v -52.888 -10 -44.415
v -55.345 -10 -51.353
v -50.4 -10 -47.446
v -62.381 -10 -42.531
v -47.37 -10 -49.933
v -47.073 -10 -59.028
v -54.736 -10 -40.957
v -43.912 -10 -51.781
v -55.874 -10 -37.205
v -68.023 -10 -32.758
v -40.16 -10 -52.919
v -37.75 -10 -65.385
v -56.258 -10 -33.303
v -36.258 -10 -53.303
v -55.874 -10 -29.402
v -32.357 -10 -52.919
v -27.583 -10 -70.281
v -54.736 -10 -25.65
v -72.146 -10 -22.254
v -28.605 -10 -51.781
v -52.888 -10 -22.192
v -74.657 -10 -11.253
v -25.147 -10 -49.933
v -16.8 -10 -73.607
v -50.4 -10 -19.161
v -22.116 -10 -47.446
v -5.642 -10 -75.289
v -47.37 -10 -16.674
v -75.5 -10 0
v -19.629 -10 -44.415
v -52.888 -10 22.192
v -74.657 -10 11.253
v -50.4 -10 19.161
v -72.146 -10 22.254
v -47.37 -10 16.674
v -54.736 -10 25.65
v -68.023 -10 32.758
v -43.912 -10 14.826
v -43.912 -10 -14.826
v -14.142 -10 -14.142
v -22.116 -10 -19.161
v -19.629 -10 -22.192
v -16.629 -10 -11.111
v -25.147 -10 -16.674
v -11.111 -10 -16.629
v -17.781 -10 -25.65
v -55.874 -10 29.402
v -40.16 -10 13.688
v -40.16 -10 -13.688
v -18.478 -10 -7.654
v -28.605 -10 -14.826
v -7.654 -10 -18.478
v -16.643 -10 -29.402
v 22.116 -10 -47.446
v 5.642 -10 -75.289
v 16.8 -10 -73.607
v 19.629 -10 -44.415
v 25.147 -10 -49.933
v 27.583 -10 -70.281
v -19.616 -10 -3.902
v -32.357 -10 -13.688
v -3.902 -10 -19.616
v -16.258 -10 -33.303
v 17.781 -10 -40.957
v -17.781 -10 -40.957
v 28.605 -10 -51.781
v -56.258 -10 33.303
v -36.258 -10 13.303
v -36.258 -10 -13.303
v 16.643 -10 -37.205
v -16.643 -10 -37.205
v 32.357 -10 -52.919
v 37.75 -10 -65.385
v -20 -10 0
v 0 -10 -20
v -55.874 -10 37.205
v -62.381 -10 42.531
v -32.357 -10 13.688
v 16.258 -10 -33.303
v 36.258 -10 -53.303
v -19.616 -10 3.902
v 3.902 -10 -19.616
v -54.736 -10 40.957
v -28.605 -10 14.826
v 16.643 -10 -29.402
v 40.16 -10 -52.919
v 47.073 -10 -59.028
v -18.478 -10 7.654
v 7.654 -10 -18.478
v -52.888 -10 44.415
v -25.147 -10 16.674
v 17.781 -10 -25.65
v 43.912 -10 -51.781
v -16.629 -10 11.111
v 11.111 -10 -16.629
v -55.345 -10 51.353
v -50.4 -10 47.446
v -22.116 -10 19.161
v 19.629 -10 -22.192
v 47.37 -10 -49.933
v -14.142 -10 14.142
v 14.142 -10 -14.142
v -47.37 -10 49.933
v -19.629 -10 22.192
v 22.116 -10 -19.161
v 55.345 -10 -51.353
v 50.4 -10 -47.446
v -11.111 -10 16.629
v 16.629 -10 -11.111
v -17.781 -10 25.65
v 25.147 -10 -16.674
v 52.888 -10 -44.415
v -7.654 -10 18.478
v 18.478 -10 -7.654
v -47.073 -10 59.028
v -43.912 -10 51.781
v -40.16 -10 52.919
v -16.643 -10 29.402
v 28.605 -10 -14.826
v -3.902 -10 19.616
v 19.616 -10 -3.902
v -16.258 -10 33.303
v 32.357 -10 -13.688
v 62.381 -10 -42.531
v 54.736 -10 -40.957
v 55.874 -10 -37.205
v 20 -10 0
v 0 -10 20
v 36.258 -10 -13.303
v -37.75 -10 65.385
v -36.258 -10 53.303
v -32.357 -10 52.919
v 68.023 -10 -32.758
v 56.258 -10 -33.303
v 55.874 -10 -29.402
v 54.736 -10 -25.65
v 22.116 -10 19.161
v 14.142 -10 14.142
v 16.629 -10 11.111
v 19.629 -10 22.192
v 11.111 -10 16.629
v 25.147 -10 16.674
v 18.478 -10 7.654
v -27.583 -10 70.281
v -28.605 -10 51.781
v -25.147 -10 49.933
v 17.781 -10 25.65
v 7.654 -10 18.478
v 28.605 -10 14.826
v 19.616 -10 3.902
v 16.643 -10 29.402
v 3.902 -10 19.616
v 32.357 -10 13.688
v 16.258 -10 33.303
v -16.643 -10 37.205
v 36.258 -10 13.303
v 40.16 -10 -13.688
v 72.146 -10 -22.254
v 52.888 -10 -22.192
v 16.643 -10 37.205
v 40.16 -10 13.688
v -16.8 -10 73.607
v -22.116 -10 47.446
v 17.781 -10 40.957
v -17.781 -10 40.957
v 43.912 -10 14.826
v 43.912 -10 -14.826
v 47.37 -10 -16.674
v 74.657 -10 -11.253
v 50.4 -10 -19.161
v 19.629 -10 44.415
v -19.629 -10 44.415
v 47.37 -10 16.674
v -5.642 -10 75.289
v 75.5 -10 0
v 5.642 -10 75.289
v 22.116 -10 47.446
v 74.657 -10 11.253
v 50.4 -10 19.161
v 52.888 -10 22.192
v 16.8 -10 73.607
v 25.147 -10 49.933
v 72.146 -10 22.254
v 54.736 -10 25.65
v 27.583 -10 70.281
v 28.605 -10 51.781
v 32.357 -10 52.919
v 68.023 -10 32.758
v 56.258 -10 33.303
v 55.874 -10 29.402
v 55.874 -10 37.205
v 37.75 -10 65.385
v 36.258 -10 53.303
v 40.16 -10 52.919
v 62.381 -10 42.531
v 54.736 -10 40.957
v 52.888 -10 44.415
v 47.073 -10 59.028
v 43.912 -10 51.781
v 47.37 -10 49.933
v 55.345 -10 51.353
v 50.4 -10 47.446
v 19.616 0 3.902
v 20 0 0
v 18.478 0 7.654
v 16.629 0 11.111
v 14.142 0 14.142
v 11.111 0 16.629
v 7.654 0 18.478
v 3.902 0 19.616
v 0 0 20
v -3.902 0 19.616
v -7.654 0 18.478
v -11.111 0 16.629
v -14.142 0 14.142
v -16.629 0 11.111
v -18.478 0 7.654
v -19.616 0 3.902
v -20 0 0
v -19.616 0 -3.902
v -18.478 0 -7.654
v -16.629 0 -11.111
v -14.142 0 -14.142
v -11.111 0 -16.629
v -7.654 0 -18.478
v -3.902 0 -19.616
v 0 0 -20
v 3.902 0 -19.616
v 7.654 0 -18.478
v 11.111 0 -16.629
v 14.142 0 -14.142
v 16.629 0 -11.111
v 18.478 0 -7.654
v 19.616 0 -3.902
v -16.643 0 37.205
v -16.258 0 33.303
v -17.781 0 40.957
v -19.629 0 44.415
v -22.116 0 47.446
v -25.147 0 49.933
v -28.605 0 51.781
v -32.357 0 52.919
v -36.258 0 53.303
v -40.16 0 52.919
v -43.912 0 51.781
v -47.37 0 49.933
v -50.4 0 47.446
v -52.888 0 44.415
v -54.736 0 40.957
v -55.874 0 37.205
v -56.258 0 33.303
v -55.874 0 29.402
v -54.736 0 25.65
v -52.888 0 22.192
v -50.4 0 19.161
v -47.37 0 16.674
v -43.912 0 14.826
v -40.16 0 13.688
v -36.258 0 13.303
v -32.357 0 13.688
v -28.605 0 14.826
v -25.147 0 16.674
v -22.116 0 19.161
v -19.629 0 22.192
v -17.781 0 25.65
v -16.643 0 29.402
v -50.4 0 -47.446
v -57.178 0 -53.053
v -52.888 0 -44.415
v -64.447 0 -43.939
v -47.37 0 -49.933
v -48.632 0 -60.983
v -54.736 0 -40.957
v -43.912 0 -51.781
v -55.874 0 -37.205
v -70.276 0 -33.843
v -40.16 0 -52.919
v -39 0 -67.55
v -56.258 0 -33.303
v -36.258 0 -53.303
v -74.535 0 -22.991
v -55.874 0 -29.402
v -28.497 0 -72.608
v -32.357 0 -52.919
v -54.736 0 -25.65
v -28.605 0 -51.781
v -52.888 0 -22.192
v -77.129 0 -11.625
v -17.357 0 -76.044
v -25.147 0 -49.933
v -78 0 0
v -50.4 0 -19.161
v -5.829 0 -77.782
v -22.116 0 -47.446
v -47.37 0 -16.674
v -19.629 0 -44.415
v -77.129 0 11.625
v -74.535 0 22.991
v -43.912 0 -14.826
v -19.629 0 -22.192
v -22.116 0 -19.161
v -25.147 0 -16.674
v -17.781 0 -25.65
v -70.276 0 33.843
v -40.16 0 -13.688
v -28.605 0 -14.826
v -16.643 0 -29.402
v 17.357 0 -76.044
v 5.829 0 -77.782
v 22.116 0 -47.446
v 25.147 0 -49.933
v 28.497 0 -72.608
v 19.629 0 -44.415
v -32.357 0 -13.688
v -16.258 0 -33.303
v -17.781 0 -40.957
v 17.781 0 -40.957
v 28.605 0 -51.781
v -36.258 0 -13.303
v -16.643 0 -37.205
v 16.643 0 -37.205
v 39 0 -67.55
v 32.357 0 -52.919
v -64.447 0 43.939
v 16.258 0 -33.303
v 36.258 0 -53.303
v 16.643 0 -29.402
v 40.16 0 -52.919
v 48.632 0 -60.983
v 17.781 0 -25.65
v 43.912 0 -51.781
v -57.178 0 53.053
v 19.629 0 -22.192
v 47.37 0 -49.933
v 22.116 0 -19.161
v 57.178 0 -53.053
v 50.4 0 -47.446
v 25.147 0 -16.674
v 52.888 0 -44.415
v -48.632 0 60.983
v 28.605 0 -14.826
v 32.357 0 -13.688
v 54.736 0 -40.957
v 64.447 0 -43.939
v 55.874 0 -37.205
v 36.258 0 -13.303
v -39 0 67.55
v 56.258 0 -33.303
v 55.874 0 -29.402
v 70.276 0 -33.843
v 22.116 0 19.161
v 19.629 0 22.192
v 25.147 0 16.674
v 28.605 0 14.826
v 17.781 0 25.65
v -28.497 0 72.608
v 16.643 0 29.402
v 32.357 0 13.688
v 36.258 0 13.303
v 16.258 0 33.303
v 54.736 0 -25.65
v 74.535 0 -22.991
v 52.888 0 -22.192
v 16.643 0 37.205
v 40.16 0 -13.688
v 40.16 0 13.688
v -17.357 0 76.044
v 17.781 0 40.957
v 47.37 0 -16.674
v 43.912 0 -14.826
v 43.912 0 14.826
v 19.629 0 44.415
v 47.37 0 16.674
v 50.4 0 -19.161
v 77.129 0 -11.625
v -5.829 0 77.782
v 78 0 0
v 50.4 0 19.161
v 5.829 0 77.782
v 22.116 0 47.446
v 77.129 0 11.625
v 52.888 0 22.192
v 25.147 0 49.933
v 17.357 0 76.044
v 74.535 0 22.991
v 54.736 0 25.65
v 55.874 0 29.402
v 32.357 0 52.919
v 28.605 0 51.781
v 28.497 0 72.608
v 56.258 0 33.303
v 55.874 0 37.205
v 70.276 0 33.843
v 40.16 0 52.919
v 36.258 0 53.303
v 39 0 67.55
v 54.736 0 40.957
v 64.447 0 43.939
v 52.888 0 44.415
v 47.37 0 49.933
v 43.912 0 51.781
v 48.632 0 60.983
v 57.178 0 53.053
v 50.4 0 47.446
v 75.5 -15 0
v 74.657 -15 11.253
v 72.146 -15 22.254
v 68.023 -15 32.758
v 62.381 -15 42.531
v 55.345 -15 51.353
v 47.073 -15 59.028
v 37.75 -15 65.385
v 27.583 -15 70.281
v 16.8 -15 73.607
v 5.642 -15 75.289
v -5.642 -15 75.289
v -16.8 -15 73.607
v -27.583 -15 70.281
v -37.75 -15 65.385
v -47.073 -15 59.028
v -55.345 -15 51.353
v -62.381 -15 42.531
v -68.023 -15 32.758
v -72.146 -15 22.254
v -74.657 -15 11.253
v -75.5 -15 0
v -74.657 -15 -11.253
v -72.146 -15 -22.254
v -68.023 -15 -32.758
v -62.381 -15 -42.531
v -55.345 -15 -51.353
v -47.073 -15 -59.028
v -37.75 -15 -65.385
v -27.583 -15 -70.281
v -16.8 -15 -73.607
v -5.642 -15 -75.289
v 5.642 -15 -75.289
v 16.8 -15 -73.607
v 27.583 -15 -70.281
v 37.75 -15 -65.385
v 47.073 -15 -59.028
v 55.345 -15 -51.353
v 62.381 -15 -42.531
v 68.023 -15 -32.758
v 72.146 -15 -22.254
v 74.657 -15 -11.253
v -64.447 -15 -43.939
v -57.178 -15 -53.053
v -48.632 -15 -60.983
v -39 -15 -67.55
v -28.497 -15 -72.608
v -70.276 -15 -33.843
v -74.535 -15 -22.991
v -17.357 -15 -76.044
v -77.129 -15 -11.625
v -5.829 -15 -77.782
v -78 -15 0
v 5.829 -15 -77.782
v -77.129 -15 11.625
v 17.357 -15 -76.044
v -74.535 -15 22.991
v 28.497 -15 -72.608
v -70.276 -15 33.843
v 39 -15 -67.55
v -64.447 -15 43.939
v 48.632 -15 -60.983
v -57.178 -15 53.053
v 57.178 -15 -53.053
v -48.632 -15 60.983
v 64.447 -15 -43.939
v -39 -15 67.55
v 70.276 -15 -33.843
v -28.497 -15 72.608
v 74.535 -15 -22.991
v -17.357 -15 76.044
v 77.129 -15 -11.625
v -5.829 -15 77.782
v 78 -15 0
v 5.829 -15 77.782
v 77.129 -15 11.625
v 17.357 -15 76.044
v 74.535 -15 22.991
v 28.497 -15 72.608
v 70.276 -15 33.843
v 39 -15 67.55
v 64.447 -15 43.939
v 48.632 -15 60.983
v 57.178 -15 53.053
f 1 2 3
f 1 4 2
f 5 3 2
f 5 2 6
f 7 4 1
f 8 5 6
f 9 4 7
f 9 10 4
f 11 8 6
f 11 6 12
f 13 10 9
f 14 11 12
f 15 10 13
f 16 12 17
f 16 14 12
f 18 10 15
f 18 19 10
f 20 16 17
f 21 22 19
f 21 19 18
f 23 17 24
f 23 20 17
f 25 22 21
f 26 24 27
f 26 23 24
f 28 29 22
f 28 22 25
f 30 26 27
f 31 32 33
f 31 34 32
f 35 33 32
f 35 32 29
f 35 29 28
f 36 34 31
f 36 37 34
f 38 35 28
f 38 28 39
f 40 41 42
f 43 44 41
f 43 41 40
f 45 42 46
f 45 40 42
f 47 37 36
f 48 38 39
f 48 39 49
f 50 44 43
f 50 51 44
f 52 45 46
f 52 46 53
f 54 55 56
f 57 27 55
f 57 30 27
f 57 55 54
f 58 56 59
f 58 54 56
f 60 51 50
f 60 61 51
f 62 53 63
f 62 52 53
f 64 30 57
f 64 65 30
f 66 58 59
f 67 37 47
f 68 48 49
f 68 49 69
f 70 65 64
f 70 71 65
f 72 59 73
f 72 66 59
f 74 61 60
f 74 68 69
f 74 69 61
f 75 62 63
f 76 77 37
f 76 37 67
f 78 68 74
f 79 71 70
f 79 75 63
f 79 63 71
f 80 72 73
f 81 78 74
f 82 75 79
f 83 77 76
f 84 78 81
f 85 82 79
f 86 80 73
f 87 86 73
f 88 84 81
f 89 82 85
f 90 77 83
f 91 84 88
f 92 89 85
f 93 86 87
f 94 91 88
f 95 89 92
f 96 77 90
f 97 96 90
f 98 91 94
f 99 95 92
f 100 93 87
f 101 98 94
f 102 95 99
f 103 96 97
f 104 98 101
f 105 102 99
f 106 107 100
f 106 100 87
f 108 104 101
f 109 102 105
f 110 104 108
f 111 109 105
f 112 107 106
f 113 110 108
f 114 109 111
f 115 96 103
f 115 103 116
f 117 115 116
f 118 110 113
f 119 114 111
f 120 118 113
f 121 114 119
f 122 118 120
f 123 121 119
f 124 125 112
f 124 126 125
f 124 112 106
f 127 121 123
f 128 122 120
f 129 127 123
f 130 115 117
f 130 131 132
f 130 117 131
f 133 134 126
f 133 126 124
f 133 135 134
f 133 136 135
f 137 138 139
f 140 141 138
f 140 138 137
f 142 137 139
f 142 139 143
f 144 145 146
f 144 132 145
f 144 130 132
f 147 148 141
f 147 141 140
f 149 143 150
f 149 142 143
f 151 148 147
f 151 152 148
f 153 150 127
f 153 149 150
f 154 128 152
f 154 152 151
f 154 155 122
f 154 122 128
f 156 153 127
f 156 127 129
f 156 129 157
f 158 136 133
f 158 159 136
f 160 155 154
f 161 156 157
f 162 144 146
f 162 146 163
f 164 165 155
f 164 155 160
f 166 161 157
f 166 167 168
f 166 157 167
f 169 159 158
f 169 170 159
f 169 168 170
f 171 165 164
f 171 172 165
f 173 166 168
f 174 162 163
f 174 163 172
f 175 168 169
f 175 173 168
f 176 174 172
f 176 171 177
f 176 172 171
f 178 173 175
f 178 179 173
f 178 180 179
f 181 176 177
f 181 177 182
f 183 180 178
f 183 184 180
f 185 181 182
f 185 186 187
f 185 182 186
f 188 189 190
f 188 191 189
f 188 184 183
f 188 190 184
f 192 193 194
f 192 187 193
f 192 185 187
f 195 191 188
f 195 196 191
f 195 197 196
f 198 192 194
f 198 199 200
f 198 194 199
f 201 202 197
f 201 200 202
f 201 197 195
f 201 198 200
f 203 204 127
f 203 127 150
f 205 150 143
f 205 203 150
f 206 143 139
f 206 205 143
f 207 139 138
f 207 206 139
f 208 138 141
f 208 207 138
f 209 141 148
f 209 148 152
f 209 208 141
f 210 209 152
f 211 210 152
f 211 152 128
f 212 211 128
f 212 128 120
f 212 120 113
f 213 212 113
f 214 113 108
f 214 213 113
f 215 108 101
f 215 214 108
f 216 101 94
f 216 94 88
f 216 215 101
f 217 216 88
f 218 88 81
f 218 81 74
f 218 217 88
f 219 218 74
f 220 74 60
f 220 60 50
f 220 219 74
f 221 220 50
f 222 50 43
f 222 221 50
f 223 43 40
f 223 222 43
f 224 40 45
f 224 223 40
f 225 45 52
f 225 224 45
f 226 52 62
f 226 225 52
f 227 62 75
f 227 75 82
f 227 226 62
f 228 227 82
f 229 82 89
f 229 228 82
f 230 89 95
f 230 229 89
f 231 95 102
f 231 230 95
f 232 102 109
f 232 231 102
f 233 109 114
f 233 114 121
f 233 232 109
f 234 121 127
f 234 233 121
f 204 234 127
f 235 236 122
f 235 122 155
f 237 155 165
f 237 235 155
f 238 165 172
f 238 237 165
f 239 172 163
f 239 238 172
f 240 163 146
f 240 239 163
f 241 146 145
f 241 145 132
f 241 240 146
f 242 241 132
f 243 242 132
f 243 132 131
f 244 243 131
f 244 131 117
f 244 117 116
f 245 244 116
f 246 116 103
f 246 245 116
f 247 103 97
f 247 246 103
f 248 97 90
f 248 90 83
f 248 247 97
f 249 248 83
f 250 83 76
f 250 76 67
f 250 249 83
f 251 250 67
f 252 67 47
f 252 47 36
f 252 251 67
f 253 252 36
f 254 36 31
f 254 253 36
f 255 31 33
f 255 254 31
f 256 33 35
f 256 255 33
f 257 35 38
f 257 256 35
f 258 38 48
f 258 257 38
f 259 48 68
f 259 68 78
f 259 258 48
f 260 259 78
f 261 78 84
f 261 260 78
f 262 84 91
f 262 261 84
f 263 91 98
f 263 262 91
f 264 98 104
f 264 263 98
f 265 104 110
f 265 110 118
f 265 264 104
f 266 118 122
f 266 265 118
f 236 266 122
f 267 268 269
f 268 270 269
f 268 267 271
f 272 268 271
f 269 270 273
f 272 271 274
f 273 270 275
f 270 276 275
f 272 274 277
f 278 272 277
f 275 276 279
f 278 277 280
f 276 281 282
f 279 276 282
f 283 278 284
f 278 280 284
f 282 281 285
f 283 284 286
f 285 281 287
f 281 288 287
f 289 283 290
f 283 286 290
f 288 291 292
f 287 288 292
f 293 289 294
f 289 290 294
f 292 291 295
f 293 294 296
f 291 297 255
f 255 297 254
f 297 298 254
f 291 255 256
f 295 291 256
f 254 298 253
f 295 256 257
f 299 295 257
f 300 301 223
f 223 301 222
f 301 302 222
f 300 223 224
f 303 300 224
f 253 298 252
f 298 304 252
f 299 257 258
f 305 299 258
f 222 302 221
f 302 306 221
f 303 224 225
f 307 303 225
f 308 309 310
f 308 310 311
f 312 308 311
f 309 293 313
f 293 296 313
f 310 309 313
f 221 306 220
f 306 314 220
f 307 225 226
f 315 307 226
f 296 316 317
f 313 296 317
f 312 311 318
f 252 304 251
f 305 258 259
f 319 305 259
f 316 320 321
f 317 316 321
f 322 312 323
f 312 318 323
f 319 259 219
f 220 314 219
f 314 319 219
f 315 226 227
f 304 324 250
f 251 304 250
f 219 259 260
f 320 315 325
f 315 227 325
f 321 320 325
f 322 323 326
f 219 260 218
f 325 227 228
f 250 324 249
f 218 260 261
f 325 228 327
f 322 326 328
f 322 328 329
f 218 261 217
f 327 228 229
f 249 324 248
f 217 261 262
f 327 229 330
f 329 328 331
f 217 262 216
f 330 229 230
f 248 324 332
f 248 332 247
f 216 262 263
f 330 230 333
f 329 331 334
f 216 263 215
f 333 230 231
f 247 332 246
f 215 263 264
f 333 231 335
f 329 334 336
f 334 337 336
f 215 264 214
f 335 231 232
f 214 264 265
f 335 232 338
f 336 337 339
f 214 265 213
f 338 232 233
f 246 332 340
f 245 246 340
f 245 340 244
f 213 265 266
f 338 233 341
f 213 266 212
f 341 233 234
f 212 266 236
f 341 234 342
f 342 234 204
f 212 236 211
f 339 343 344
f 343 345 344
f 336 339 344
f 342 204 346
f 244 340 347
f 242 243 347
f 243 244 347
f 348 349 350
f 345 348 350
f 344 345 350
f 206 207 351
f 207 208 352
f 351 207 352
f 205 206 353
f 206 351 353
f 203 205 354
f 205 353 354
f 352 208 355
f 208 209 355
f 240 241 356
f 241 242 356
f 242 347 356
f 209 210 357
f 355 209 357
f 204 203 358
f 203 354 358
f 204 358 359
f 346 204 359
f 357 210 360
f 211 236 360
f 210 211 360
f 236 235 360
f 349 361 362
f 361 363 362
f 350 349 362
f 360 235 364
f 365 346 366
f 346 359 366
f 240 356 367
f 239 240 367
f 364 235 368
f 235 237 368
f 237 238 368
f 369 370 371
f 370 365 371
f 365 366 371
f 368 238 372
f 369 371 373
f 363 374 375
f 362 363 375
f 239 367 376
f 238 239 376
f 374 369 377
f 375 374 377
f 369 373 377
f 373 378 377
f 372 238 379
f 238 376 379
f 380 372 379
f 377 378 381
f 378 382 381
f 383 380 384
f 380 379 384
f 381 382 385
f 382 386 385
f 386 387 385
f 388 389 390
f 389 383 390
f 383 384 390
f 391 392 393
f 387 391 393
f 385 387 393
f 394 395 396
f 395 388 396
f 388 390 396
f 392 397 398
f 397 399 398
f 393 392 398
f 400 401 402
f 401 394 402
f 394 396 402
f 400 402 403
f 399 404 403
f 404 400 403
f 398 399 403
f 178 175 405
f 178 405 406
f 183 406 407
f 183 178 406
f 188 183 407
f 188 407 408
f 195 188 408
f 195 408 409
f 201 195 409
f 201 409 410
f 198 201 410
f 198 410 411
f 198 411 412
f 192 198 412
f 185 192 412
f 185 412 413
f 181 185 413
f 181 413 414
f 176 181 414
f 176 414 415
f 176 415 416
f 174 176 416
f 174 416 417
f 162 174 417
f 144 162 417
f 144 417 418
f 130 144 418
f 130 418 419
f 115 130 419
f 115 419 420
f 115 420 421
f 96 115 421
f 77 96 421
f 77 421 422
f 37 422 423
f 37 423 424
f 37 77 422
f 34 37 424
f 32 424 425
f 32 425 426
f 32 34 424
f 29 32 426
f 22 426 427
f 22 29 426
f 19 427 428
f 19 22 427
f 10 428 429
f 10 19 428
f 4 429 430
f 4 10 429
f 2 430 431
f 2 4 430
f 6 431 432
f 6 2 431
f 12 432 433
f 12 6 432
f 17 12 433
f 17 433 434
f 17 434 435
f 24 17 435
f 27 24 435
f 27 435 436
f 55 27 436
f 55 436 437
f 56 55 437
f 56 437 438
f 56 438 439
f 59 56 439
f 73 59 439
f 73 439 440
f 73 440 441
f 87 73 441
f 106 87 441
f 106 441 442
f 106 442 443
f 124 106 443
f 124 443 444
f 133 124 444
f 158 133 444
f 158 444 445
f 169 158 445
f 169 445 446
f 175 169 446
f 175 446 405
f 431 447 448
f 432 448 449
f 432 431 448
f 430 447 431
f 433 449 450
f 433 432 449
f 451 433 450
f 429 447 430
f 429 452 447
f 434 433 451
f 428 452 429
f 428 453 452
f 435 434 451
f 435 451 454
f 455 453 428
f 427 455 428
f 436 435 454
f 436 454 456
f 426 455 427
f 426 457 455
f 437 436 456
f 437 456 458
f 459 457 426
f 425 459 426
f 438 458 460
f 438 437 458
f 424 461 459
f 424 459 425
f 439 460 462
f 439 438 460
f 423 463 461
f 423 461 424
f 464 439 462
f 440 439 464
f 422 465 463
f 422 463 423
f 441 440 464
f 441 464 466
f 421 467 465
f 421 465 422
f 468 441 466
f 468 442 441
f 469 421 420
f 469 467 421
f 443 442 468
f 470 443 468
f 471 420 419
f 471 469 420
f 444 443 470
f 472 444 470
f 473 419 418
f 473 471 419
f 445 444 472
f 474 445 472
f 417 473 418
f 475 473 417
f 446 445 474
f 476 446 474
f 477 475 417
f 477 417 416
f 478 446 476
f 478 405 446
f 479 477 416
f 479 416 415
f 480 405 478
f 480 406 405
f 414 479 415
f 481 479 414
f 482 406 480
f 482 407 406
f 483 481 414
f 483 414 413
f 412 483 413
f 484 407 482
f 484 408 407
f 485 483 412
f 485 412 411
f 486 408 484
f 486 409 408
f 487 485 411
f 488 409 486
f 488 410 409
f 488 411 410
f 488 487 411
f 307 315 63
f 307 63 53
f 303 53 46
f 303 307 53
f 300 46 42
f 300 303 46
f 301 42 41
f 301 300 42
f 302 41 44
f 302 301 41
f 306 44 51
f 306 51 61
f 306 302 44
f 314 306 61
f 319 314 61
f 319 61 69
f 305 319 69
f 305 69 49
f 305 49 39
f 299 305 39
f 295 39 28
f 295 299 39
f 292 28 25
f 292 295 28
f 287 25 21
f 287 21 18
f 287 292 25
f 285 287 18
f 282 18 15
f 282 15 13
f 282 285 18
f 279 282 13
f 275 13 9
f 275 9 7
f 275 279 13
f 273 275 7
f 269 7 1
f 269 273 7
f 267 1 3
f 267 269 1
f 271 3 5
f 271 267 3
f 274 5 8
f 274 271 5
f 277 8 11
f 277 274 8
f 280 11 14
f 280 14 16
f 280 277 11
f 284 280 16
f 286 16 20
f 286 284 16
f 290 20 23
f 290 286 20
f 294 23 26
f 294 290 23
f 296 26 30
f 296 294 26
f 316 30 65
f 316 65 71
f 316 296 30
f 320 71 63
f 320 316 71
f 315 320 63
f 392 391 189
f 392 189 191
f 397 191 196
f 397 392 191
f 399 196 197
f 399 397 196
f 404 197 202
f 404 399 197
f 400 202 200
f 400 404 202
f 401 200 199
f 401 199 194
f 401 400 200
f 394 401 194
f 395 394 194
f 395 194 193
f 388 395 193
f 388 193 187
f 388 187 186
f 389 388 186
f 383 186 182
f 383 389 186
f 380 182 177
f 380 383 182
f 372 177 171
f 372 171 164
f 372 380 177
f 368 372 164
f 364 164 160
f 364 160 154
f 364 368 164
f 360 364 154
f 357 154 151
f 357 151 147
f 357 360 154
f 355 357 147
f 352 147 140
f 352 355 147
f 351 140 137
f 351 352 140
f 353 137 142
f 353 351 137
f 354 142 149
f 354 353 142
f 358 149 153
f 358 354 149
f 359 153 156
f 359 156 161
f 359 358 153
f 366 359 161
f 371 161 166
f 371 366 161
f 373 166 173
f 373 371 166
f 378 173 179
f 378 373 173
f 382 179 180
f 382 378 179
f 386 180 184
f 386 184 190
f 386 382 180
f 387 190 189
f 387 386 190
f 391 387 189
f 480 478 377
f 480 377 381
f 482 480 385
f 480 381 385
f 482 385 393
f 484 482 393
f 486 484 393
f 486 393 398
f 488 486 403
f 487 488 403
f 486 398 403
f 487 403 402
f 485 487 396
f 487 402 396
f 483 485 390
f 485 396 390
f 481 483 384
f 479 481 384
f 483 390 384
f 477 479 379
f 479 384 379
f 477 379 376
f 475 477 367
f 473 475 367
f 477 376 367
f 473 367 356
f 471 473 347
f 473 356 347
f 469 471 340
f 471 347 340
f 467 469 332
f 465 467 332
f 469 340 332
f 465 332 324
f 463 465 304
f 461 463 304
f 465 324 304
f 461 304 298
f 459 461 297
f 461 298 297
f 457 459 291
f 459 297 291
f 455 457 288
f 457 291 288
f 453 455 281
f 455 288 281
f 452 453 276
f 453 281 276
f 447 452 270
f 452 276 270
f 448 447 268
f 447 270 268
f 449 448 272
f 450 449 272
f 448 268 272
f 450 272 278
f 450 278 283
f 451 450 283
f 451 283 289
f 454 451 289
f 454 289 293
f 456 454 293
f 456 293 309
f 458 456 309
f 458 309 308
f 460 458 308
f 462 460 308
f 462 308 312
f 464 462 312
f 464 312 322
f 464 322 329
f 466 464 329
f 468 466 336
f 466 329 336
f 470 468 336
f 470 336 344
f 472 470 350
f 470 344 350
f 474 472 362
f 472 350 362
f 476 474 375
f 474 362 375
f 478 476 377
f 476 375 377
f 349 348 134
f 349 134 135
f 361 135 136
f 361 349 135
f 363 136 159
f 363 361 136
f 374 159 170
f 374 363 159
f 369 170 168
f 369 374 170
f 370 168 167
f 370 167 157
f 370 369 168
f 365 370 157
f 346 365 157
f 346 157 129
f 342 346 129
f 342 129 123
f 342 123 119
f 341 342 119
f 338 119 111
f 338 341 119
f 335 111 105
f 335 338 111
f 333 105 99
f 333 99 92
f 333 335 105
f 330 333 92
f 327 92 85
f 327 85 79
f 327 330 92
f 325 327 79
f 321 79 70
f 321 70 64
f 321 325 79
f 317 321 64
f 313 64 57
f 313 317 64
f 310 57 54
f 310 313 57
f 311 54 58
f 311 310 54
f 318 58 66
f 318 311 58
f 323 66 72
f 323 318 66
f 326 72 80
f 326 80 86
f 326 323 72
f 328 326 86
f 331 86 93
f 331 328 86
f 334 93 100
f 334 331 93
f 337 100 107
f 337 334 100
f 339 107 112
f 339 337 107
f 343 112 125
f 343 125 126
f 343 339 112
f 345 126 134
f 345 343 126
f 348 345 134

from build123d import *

# Parameters (mm, degrees)
F0_R     = 75.5
F0_R_2   = 20
F1_DEPTH = 10
F0_R_3   = 78
F2_DEPTH = 15


with BuildPart() as f1:
    # F0 (on Front) → F1 (new body)
    with BuildSketch(Plane.XZ):
        Circle(F0_R)
        with Locations((-36.258319, -33.303391)):
            Circle(F0_R_2, mode=Mode.SUBTRACT)
        with Locations((36.258319, -33.303391)):
            Circle(F0_R_2, mode=Mode.SUBTRACT)
        with Locations((-36.258319, 33.303391)):
            Circle(F0_R_2, mode=Mode.SUBTRACT)
        Circle(F0_R_2, mode=Mode.SUBTRACT)
        with Locations((36.258319, 33.303391)):
            Circle(F0_R_2, mode=Mode.SUBTRACT)
    extrude(amount=F1_DEPTH)

    # F0 (on Front) → F2 (join)
    with BuildSketch(Plane.XZ):
        Circle(F0_R_3)
        Circle(F0_R, mode=Mode.SUBTRACT)
    extrude(amount=F2_DEPTH)


solid = f1.part
